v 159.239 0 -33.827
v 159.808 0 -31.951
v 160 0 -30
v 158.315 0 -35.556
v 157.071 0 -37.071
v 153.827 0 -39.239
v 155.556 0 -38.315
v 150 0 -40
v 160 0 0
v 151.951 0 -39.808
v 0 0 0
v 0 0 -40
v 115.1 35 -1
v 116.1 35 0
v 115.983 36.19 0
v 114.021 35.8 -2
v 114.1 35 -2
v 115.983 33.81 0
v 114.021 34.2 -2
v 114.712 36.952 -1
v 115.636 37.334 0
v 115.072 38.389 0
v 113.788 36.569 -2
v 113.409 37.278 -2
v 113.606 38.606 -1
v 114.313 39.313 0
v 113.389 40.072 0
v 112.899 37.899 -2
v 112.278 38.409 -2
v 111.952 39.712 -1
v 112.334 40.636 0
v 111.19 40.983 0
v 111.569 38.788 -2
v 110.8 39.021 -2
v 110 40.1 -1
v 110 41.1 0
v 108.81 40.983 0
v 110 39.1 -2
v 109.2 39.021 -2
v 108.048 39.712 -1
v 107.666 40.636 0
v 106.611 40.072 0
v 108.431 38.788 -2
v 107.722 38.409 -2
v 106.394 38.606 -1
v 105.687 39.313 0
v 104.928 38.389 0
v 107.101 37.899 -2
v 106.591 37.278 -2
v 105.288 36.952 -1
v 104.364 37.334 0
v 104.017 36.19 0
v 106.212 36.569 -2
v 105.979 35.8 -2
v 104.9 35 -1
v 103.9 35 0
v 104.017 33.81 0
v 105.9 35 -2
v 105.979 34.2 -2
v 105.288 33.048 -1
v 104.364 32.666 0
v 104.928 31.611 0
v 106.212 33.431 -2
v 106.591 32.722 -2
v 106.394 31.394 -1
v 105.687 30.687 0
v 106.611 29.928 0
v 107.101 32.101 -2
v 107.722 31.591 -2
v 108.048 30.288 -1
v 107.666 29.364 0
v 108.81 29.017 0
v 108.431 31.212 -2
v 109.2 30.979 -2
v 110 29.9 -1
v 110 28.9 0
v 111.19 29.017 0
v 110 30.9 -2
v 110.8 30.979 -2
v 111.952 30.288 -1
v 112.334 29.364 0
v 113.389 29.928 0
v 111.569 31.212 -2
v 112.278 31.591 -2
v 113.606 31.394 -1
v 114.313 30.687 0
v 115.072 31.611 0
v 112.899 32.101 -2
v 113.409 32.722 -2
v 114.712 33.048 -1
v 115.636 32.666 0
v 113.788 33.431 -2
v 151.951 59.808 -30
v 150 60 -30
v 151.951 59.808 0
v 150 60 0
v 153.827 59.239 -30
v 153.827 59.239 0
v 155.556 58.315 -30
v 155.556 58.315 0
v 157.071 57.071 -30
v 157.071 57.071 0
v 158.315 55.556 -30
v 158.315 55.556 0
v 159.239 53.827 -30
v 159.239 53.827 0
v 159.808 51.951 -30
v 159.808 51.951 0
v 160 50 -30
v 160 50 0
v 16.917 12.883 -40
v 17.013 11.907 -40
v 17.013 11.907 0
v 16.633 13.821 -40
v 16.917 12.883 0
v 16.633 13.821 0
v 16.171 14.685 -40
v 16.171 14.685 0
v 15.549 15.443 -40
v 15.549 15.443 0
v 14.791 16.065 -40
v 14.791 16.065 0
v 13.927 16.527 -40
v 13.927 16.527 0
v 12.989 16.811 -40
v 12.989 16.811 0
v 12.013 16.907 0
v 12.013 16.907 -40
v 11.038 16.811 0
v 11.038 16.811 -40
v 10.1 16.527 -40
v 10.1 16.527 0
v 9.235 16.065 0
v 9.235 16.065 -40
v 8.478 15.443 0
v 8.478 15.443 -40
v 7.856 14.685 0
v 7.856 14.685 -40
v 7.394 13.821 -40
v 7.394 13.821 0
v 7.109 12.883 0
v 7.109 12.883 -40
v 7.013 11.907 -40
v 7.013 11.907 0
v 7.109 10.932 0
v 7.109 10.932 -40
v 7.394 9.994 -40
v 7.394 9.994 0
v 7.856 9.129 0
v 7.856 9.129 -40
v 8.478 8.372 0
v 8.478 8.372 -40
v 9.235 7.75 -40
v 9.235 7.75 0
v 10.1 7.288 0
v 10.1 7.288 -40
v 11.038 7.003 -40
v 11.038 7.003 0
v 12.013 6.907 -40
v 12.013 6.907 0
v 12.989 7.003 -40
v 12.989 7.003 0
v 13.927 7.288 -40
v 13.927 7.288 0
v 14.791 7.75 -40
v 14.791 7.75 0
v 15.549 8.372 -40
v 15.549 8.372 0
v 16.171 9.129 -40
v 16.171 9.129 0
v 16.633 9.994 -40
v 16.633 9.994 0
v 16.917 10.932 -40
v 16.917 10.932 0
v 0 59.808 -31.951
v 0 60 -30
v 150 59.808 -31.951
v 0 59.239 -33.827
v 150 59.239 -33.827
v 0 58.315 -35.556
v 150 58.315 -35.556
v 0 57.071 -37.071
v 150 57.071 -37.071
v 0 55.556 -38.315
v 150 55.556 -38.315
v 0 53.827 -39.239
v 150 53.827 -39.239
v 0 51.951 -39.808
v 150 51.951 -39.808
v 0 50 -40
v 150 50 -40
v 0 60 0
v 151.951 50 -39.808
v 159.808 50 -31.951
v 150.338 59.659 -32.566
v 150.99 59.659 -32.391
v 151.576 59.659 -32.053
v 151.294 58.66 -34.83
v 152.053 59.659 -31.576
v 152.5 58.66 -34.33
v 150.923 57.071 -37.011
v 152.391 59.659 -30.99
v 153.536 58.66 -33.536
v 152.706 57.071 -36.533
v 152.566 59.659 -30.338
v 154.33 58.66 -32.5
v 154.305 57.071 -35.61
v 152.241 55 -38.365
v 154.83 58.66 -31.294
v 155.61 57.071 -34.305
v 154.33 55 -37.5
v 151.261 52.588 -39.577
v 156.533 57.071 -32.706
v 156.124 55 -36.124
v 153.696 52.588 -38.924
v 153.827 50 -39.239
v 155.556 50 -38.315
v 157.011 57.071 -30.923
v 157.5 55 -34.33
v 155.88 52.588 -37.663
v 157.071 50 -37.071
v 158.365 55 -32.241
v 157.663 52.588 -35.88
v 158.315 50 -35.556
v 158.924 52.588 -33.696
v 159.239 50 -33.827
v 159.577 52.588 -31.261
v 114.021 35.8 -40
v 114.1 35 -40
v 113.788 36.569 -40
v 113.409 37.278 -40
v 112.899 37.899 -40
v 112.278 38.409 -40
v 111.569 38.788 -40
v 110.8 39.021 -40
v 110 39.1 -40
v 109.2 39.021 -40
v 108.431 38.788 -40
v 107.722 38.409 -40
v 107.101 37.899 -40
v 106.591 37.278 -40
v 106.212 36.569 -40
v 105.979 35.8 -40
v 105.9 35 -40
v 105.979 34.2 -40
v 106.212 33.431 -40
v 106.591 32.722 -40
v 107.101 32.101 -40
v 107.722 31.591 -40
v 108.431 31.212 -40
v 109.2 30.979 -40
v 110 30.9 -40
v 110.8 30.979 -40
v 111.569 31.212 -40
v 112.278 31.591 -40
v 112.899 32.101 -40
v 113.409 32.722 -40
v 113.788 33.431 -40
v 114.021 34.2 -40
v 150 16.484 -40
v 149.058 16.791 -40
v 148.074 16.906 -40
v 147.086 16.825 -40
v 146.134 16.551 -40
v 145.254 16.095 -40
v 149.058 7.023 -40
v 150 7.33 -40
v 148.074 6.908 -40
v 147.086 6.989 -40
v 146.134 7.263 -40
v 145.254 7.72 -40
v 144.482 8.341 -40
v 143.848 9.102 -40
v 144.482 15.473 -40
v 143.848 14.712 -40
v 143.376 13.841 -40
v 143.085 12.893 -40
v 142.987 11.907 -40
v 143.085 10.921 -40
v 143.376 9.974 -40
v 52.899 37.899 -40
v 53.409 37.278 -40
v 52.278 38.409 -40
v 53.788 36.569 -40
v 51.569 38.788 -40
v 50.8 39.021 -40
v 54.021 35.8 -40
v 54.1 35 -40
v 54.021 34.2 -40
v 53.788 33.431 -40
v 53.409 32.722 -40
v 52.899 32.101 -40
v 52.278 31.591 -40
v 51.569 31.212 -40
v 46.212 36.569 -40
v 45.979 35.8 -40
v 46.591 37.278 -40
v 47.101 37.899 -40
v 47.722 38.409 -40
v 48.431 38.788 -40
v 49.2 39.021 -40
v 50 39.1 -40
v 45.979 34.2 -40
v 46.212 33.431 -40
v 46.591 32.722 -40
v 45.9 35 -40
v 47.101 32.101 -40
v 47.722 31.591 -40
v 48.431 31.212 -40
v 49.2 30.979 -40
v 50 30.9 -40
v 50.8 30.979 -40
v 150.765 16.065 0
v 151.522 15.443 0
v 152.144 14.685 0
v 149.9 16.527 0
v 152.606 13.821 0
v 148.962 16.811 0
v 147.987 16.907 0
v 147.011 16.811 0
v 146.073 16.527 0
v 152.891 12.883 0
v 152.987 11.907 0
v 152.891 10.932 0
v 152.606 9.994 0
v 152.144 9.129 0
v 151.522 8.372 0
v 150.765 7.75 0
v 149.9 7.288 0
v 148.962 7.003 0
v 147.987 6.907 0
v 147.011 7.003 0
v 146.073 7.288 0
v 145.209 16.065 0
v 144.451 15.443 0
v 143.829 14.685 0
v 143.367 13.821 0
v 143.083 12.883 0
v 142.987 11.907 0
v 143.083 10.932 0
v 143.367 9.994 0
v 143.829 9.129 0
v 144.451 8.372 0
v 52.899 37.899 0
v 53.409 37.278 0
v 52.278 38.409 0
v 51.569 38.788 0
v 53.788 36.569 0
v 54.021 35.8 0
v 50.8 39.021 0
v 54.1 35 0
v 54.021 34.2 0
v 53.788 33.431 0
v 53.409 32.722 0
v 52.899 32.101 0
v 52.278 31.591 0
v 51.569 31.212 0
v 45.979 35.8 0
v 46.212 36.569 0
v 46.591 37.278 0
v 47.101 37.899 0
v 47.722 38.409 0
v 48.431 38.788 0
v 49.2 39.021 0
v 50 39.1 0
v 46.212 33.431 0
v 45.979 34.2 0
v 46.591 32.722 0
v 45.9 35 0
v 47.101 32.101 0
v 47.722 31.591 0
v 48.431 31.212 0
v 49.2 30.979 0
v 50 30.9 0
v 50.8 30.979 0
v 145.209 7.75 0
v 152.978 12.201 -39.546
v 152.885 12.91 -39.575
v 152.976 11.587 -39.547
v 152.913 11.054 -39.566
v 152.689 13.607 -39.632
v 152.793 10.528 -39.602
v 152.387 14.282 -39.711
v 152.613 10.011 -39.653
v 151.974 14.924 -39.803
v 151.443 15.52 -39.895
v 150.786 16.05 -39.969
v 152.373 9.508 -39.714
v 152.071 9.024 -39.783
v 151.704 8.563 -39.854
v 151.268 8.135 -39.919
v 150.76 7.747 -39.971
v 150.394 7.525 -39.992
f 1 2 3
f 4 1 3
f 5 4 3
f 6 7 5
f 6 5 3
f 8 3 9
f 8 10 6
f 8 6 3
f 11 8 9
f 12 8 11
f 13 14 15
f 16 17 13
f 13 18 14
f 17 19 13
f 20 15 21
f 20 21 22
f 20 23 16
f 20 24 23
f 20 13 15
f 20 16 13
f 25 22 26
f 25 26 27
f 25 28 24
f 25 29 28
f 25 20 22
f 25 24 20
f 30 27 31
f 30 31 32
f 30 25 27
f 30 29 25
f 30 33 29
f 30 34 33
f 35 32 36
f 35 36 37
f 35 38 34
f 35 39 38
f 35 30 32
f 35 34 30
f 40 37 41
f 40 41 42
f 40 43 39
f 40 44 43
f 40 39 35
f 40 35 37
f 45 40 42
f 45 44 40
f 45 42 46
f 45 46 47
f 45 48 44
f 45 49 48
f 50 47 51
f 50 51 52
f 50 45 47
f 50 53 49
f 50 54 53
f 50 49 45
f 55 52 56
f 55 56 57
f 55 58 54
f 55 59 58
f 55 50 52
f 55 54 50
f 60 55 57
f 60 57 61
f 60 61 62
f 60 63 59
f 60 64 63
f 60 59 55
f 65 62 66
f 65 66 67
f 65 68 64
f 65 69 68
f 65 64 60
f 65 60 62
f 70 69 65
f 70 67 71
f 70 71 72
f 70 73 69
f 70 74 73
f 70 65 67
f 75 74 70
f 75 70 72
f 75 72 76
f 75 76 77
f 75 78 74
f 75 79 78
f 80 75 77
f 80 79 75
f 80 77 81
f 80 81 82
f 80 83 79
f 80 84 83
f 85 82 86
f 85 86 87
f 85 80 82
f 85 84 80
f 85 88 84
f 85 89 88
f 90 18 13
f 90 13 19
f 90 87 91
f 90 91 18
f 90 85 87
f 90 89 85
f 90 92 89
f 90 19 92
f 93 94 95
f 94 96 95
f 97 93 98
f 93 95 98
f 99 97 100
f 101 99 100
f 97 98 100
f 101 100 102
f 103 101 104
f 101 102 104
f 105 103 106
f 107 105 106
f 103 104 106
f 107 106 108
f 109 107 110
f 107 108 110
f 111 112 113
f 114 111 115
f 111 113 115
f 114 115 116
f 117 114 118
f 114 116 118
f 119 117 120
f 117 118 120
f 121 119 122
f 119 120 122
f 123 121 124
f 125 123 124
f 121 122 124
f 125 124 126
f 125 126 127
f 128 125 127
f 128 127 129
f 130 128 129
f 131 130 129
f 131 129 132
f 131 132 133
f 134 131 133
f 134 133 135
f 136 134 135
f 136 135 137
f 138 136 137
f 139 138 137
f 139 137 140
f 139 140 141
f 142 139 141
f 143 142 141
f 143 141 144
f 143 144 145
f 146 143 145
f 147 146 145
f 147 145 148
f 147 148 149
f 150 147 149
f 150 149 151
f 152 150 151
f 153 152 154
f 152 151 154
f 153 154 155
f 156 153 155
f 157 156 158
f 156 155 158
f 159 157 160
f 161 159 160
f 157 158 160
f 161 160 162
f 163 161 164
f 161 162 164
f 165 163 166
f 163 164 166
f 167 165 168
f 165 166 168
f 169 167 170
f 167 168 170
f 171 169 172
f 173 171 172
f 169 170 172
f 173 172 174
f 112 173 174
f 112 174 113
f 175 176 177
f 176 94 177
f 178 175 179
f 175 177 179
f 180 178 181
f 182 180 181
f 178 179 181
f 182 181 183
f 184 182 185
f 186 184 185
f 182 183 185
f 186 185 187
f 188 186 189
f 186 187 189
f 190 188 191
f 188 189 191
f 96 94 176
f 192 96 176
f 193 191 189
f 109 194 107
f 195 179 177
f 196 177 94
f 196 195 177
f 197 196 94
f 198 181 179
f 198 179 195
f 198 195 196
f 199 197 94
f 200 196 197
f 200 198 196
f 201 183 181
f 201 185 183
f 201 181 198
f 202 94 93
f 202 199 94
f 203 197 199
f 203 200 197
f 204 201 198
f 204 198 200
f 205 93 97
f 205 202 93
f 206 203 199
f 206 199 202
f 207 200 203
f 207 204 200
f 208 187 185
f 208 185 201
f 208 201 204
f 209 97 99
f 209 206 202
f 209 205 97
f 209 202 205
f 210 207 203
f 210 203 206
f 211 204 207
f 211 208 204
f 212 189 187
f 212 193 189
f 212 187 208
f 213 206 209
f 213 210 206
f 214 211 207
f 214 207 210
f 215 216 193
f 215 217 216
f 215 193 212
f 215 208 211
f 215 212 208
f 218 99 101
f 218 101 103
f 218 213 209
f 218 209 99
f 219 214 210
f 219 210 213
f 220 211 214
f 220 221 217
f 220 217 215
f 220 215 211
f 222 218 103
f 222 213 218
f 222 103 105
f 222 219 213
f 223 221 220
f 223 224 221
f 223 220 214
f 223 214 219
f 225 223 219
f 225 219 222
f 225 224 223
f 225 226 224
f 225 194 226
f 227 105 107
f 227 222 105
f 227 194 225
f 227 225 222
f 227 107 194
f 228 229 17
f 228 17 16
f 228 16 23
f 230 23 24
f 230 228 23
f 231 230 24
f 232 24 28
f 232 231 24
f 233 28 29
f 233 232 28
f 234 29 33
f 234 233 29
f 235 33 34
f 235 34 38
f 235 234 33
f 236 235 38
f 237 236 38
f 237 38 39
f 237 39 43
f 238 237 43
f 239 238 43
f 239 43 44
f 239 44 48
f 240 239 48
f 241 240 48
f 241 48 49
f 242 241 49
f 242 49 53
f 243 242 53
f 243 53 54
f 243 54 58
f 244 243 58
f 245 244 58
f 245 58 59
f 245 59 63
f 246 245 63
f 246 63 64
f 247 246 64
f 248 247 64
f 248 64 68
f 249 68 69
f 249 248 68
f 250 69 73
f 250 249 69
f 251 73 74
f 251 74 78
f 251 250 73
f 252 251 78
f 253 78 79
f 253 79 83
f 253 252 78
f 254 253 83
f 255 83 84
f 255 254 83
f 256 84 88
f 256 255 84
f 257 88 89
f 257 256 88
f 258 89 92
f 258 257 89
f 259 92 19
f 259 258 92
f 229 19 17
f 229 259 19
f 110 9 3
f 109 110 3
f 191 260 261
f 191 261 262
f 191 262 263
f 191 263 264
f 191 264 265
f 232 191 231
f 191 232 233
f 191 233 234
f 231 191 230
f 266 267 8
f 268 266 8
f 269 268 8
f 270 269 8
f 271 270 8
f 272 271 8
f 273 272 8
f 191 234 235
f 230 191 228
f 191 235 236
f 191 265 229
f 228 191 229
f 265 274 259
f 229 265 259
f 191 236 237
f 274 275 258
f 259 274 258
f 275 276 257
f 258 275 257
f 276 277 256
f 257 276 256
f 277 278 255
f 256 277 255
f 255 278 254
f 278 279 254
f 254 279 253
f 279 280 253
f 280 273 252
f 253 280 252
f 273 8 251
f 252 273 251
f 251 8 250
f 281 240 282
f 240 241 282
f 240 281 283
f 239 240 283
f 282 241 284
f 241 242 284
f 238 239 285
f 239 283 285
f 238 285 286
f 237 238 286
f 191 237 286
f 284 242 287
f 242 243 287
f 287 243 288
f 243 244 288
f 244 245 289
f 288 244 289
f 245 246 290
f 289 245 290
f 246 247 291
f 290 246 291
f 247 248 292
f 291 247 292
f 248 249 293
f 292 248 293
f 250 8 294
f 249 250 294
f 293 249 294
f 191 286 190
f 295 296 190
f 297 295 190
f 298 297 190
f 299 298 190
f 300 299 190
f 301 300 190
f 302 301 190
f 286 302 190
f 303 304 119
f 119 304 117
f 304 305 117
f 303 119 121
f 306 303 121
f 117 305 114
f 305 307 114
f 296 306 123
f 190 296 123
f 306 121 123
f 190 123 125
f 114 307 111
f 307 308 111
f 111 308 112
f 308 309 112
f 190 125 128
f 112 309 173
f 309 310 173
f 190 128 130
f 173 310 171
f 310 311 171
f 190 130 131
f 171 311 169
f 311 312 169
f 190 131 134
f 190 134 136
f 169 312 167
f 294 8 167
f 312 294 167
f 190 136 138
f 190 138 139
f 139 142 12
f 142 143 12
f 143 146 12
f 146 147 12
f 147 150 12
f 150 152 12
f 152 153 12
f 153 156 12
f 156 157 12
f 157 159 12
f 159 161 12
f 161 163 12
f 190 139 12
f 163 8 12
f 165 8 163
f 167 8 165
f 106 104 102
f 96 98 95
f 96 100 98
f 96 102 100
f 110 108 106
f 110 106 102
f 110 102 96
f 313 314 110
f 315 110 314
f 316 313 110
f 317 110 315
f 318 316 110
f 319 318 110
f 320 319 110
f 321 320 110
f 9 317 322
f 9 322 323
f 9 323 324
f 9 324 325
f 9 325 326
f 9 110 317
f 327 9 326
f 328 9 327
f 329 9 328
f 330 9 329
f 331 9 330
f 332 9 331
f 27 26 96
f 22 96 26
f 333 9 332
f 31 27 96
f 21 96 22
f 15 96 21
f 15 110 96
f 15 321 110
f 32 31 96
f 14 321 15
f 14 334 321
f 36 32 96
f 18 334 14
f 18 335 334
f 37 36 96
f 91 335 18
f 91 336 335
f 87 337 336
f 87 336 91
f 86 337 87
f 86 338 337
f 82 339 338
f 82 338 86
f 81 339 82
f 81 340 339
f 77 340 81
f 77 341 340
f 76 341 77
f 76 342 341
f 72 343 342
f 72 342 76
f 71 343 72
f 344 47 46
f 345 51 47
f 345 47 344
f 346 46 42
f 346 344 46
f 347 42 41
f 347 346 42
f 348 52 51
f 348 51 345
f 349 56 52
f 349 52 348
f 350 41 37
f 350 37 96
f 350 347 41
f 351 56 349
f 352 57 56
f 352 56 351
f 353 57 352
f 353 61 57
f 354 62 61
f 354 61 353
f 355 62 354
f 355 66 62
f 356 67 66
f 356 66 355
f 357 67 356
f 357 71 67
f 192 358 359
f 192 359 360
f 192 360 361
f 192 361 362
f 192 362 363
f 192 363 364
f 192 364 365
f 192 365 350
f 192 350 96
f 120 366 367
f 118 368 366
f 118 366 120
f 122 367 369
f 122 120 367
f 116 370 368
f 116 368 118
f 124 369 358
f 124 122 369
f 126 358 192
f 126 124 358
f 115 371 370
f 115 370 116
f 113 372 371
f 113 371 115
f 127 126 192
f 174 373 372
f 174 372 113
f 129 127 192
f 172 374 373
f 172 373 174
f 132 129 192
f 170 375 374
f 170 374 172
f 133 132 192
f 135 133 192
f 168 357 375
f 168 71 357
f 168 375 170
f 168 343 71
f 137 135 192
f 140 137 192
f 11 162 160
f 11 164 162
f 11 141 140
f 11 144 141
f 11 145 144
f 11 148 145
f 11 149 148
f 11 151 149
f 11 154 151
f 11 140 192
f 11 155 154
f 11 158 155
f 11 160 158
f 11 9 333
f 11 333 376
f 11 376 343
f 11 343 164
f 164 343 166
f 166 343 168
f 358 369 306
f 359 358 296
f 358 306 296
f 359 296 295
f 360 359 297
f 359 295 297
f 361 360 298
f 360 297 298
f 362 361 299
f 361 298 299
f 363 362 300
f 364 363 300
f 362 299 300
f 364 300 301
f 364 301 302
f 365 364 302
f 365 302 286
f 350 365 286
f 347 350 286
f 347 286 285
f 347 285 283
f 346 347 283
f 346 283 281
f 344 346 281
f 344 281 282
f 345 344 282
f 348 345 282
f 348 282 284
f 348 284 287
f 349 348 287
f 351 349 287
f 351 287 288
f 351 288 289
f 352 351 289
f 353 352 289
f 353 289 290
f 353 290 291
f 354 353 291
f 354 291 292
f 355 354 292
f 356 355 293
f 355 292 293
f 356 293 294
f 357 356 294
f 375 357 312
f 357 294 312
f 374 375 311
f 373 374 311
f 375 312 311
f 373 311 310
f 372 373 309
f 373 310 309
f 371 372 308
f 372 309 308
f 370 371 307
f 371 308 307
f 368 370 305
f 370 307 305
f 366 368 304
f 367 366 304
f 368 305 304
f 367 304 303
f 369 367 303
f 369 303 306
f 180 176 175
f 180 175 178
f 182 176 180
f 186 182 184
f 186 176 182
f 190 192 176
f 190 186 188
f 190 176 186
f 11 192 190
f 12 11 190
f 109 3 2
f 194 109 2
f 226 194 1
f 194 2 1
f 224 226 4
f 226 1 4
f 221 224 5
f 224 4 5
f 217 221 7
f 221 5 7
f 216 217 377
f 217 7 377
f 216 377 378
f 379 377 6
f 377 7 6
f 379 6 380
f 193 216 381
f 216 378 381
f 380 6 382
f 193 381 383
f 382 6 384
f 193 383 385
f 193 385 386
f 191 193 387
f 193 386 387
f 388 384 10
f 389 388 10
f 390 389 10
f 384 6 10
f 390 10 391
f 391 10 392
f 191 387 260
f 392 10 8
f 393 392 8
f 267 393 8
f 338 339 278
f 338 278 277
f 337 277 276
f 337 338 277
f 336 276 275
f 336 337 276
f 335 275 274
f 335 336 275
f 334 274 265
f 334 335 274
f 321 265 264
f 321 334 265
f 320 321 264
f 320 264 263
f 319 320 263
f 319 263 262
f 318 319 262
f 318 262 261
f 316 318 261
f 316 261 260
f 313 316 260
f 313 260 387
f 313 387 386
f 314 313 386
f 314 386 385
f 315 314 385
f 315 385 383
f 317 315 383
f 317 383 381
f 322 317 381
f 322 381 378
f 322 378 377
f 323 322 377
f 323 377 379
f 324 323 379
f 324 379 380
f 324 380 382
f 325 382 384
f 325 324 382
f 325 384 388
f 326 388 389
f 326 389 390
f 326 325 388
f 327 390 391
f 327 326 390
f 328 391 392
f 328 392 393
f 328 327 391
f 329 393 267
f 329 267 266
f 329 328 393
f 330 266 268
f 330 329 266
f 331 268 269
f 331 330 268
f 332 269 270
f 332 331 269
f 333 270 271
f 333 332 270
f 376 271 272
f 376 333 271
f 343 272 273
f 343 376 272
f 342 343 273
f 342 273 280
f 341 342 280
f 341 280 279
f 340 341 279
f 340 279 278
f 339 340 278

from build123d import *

# Parameters (mm, degrees)
SKETCH1_W                  = 80
SKETCH1_H                  = 40
CNFBOSS_EXTRUDE1_DEPTH     = 60
SKETCH2_R                  = 5
CNFCUT_DEPTH               = 108.703296143
F_8_2_8_2_DIAMETER_HOLE1_D = 8.2
CNFFILLET_R                = 10
CNFFILLET2_R               = 10
CNFCHAMFER_SIZE            = 2


with BuildPart() as part:
    # Sketch1 → cnfBoss-Extrude1 (new body)
    with BuildSketch(Plane(origin=(0, 0, 0), x_dir=(1, 0, 0), z_dir=(0, 1, 0))):
        with Locations((40, 20)):
            Rectangle(SKETCH1_W, SKETCH1_H)
    extrude(amount=CNFBOSS_EXTRUDE1_DEPTH)

    # Sketch2 → cnfCut (cut, through all)
    with BuildSketch(Plane.XY):
        with Locations((12.01333081, 11.907221875)):
            Circle(SKETCH2_R)
    extrude(amount=-CNFCUT_DEPTH, mode=Mode.SUBTRACT)

    # Ø8.2 (8.2) Diameter Hole1 (through all)
    with Locations(Plane.XY):
        with Locations((50, 35)):
            Hole(F_8_2_8_2_DIAMETER_HOLE1_D / 2)

    # cnfMirror: part across plane


with BuildPart() as part_1:
    add(part.part)
    add(part.part.mirror(Plane(origin=(80, 60, 0), x_dir=(0, 0, 1), z_dir=(-1, 0, 0))))

    # cnfFillet
    # the kernel refuses this fillet: 10 mm, written as the material it takes off along each edge
    with BuildSketch(Plane(origin=(160, -25, -40), x_dir=(-1, 0, 0), z_dir=(0, 1, 0))) as cnffillet_piece_1:
        with BuildLine():
            CenterArc((CNFFILLET_R, CNFFILLET_R), CNFFILLET_R, 180, 90)
            Line((0, CNFFILLET_R), (0, 0))
            Line((0, 0), (CNFFILLET_R, 0))
        make_face()
    extrude(amount=110, mode=Mode.SUBTRACT)

    # cnfFillet2
    cnffillet2_edges = [part_1.edges().sort_by_distance(p)[0] for p in [
        (75, 60, -40),
        (160, 60, -15),
        (157.071067812, 60, -37.071067812),
    ]]
    fillet(cnffillet2_edges, radius=CNFFILLET2_R)

    # cnfChamfer
    cnfchamfer_edges = [part_1.edges().sort_by_distance(p)[0] for p in [
        (105.9, 35, 0),
    ]]
    chamfer(cnfchamfer_edges, length=CNFCHAMFER_SIZE)


solid = part_1.part
